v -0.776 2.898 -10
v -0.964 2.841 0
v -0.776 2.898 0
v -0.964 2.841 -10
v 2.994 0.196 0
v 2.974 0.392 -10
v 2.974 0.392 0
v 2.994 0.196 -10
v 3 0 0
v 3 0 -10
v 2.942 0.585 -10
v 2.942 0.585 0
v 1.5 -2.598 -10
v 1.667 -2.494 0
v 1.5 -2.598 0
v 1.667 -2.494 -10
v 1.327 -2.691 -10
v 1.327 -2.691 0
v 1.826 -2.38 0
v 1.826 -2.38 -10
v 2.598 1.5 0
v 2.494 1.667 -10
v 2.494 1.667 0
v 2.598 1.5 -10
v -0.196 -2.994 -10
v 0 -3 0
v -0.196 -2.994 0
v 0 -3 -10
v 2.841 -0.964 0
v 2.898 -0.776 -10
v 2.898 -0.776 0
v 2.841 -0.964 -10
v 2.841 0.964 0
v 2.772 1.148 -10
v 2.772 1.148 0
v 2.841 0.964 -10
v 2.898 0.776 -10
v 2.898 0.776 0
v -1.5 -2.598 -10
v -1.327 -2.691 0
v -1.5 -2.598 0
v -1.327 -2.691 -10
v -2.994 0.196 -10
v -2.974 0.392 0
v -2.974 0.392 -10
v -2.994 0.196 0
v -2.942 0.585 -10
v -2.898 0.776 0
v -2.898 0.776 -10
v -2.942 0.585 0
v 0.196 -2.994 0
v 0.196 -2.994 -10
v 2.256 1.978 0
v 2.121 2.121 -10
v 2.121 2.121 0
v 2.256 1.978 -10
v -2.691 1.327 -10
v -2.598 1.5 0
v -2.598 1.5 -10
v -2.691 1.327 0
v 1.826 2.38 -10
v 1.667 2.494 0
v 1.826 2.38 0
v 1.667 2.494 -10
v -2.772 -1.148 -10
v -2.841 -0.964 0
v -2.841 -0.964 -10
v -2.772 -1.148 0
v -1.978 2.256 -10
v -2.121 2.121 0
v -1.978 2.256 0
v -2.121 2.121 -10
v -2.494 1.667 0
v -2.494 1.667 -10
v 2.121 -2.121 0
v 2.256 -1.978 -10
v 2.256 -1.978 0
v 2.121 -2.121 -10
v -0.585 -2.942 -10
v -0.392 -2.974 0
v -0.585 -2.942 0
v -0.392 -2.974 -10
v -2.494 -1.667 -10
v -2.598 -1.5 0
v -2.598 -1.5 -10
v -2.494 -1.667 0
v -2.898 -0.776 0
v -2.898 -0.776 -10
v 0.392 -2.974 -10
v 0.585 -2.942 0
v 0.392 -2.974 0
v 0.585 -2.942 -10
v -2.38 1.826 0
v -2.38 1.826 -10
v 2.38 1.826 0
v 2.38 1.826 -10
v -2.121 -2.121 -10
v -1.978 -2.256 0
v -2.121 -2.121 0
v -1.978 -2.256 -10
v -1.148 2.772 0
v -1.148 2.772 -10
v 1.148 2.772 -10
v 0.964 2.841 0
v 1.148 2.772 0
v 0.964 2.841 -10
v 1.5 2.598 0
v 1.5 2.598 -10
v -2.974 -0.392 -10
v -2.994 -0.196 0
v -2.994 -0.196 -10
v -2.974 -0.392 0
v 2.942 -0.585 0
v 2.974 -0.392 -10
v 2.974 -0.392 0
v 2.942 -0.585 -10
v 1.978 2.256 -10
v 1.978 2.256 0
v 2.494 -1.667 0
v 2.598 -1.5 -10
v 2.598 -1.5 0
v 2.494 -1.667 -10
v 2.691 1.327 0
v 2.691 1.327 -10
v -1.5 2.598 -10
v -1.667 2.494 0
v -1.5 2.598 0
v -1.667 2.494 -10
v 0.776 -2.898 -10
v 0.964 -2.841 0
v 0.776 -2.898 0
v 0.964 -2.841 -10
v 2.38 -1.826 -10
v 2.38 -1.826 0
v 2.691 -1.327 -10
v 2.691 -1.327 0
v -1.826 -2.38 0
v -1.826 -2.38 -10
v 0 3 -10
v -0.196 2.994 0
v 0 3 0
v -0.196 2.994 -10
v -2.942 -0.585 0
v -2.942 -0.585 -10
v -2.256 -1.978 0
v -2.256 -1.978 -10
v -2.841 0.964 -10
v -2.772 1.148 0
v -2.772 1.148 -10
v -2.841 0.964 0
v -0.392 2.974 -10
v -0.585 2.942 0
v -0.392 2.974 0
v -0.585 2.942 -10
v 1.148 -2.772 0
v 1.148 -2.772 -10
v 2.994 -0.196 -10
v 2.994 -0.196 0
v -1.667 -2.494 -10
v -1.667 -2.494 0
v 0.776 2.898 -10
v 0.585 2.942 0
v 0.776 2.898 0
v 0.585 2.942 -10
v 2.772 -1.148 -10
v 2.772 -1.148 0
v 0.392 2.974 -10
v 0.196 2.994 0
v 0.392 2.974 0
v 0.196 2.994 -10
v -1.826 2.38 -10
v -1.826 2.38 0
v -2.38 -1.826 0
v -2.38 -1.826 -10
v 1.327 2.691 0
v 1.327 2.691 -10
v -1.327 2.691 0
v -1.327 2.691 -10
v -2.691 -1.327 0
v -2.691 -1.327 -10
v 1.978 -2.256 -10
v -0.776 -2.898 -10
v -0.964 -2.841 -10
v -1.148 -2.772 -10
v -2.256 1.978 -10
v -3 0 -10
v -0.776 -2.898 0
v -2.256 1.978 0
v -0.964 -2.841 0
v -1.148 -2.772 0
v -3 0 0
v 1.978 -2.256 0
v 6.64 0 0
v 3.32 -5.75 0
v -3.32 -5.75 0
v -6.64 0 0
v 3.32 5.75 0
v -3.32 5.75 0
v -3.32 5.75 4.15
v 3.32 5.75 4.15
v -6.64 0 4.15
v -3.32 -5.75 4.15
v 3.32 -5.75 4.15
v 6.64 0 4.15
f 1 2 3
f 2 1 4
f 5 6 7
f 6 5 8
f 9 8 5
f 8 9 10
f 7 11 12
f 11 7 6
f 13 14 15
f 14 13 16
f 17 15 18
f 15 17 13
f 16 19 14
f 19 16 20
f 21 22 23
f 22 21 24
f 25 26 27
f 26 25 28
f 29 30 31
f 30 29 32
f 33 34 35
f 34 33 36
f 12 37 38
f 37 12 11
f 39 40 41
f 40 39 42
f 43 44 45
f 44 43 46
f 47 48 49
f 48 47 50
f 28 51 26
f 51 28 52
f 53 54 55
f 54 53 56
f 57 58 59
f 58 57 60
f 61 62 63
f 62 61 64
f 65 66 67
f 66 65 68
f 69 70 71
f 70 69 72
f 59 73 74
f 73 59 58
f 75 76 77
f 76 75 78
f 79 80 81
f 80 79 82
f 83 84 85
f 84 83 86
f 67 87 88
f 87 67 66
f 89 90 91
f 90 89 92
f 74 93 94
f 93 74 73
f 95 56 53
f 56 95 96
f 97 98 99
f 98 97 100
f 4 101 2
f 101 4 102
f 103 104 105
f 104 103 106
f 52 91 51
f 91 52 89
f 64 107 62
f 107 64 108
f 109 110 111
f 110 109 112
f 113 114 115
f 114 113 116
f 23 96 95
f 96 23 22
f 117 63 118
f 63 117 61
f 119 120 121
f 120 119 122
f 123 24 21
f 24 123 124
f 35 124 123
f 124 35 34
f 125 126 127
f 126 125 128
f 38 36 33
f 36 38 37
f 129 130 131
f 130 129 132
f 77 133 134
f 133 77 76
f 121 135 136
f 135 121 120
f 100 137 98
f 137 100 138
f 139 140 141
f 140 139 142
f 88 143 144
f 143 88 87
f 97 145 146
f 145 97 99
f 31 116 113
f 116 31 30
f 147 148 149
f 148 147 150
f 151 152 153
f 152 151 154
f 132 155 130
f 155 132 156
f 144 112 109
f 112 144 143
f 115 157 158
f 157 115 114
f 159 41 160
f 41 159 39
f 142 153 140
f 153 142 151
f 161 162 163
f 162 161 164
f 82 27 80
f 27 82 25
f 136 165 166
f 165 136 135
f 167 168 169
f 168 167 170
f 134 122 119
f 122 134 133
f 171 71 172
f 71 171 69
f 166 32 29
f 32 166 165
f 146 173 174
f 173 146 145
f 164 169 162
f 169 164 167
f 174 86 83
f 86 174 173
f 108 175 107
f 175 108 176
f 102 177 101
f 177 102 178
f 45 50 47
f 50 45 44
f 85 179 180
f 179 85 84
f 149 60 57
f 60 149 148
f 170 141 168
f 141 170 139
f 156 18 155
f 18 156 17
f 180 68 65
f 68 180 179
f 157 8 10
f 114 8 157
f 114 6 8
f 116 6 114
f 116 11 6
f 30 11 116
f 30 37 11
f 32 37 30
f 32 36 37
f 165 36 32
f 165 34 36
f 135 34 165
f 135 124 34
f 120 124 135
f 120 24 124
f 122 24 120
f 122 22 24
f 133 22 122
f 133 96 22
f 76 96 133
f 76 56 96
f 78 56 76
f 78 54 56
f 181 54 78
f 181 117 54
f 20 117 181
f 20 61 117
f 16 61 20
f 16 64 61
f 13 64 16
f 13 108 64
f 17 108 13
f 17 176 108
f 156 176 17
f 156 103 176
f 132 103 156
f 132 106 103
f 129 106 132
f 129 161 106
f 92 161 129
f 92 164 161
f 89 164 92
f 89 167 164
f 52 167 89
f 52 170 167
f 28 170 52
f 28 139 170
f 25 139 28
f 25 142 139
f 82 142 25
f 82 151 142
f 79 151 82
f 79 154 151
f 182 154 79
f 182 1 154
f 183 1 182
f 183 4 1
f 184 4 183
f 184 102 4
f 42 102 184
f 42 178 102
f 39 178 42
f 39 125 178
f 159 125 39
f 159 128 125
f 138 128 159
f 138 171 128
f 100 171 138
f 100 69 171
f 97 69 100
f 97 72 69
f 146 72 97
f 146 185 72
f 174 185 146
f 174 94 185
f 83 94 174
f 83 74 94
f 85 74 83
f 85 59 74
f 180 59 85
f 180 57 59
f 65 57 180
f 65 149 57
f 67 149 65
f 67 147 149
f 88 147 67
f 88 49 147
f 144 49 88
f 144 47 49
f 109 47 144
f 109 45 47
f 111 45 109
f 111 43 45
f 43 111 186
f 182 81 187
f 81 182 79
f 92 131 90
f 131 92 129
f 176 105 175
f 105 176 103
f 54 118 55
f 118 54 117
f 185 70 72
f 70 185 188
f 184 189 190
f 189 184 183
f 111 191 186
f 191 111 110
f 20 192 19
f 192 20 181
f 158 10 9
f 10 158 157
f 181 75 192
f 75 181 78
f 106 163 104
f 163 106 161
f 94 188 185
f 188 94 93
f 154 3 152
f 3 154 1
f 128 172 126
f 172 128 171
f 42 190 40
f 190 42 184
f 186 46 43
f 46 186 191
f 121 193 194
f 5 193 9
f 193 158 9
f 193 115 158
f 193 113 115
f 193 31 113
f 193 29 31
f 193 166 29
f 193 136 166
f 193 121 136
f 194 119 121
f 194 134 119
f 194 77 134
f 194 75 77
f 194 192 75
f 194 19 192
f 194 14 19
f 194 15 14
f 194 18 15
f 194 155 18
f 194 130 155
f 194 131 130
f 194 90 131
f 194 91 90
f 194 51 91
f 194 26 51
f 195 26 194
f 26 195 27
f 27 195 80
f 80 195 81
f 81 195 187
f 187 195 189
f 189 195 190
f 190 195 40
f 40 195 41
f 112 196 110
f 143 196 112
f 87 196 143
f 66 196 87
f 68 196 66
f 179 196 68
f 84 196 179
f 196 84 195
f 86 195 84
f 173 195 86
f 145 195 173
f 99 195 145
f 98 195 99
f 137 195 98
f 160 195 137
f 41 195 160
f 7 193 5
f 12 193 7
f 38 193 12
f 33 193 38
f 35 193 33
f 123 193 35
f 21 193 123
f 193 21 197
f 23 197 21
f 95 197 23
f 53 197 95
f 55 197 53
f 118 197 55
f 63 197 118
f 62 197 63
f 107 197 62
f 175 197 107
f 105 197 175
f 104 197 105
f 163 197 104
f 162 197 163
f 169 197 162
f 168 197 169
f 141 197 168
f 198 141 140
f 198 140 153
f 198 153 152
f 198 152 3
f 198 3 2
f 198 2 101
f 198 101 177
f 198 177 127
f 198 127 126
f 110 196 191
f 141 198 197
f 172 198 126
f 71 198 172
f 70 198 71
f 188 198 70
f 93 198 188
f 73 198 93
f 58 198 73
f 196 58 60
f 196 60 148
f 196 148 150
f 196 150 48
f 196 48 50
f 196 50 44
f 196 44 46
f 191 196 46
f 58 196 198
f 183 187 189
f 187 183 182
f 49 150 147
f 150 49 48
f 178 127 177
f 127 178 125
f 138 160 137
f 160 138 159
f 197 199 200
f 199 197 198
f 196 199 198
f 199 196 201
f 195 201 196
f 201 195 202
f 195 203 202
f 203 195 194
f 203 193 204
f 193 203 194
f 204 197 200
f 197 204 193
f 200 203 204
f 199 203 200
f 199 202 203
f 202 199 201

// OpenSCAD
$fn = 96;

// Dimensions (mm)
shaft_d = 6.0;
shaft_r = shaft_d/2;

head_flat_d = 11.5;          // across flats
head_h = 4.15;

length_under_head = 10.0;    // shaft length below head

module hex_prism(af, h) {
    // Regular hexagon: across flats = 2 * apothem
    // For a regular hexagon, apothem = R * cos(30) where R is circumradius
    // So R = (af/2) / cos(30)
    R = (af/2) / cos(30);
    linear_extrude(height=h)
        polygon(points=[for (i=[0:5]) [R*cos(60*i), R*sin(60*i)]]);
}

module hex_head_screw() {
    union() {
        // Shaft (under head)
        translate([0,0,-length_under_head])
            cylinder(h=length_under_head, r=shaft_r);

        // Hex head
        hex_prism(head_flat_d, head_h);
    }
}

hex_head_screw();
